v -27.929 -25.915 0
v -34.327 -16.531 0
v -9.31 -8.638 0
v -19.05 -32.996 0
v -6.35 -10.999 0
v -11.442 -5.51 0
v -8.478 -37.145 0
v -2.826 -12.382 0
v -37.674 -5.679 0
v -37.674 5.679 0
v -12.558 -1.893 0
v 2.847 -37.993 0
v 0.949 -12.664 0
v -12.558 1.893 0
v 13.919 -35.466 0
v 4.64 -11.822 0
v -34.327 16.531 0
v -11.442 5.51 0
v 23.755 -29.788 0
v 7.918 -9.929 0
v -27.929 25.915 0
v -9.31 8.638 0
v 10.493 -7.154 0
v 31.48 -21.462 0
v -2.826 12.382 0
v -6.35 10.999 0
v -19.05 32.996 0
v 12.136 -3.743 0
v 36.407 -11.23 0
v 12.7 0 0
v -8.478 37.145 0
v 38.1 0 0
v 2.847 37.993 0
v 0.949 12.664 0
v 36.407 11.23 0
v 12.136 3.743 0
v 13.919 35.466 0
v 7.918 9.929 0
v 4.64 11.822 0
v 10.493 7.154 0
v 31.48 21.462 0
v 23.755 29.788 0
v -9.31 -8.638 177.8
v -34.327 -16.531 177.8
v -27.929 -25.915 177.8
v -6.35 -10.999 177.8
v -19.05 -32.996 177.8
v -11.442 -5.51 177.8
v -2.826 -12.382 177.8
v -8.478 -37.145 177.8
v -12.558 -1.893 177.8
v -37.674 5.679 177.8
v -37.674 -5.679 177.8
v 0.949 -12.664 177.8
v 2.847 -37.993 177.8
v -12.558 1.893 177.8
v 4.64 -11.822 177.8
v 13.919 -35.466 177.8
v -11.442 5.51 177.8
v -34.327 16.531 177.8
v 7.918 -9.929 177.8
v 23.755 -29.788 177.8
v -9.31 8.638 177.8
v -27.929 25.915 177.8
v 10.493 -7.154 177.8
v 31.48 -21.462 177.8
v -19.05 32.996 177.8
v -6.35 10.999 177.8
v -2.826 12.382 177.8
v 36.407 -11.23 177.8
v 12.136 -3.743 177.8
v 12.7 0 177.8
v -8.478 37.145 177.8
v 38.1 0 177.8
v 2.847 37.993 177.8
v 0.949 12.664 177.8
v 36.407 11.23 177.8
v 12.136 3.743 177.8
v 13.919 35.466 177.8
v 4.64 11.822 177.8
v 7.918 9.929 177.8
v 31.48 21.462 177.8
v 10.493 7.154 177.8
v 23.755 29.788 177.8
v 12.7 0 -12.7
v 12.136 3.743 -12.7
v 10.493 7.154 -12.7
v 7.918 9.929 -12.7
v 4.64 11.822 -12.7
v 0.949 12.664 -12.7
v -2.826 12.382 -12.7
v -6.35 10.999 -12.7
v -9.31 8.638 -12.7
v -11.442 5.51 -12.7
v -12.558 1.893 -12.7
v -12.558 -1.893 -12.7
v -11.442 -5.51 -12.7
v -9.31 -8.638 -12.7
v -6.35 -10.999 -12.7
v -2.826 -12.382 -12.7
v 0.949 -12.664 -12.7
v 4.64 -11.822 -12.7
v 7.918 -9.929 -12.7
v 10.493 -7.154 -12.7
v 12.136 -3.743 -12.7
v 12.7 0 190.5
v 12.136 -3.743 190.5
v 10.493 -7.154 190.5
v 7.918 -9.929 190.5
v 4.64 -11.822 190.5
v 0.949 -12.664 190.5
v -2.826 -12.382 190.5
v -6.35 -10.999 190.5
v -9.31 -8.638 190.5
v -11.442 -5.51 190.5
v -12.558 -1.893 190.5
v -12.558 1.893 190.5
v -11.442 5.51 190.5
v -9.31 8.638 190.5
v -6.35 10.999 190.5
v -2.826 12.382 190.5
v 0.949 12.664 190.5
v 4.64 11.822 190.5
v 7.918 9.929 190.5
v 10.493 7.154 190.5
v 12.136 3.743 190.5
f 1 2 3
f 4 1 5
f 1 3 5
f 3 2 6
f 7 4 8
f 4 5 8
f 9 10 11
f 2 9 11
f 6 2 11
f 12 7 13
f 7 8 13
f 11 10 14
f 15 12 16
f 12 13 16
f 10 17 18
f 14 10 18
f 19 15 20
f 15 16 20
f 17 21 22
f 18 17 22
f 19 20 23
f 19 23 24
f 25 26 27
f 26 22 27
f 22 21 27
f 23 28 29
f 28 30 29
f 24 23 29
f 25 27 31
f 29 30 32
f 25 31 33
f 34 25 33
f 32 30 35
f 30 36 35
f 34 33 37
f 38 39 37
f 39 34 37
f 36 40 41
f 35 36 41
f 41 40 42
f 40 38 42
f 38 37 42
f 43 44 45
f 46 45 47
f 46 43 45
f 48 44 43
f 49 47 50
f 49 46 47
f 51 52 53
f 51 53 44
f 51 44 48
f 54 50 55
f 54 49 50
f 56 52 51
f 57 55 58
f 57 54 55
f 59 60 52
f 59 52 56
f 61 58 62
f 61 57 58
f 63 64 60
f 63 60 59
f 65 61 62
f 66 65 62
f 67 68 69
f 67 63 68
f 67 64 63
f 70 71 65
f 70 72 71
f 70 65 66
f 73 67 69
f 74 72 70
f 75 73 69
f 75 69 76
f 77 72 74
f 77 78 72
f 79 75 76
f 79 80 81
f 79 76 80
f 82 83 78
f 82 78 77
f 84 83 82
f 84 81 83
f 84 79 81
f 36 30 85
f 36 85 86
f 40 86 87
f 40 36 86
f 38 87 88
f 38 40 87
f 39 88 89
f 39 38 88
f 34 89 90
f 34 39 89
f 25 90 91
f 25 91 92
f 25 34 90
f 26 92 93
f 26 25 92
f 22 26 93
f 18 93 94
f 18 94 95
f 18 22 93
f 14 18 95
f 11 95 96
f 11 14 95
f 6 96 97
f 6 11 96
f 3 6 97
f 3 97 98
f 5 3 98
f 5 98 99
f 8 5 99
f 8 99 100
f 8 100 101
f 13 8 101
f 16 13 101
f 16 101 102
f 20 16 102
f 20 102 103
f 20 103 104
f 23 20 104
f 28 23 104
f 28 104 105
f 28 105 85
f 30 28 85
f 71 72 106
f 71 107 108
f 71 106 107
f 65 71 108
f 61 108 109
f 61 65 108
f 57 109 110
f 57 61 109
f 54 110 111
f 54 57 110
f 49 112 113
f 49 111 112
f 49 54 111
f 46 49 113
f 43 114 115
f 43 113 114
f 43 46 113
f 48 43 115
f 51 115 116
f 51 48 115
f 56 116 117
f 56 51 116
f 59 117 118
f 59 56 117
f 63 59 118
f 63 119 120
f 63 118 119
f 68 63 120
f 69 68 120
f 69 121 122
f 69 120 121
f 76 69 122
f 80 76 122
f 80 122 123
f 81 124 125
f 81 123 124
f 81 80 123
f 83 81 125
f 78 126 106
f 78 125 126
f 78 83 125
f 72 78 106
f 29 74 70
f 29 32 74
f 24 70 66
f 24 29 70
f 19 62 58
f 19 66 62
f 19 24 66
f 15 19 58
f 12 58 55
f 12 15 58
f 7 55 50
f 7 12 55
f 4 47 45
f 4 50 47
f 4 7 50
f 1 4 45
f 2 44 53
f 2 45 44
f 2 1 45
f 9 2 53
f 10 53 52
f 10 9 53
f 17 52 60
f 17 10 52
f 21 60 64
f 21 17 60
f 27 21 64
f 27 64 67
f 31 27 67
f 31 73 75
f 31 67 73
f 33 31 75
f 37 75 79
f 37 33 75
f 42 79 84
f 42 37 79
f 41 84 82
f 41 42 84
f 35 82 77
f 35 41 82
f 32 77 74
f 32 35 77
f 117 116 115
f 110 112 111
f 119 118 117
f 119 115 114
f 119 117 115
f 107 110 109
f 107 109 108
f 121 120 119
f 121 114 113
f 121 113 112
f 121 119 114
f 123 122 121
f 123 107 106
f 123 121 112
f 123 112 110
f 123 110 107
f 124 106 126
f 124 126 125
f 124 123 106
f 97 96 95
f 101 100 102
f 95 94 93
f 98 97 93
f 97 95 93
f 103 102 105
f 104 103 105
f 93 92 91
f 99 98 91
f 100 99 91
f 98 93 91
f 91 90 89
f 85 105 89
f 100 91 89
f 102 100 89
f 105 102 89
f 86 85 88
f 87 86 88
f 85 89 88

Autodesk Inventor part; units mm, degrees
ref_plane "YZ Plane" through (0, 0, 0) normal (1, 0, 0) x (0, 1, 0)
ref_plane "XZ Plane" through (0, 0, 0) normal (0, 1, 0) x (-1, 0, 0)
ref_plane "XY Plane" through (0, 0, 0) normal (0, 0, 1) x (1, 0, 0)
sketch "Sketch1" plane through (0, 0, 0) normal (0, 0, 1) x (1, 0, 0)
  circle A0 centre (0, 0) radius 38.1
  dimension "d0" = 76.2
extrude "Extrusion1" add sketch "Sketch1" along normal blind 177.8
sketch "Sketch2" plane through (0, 0, 177.8) normal (0, 0, 1) x (1, 0, 0)
  circle A0 centre (0, 0) radius 38.1 projected
  circle A1 centre (0, 0) radius 12.7
  dimension "d3" = 25.4
extrude "Extrusion2" add sketch "Sketch2" along normal blind 12.7 and the other way blind 190.5 contours A1
properties part number "Shooter_LowerMotor"
